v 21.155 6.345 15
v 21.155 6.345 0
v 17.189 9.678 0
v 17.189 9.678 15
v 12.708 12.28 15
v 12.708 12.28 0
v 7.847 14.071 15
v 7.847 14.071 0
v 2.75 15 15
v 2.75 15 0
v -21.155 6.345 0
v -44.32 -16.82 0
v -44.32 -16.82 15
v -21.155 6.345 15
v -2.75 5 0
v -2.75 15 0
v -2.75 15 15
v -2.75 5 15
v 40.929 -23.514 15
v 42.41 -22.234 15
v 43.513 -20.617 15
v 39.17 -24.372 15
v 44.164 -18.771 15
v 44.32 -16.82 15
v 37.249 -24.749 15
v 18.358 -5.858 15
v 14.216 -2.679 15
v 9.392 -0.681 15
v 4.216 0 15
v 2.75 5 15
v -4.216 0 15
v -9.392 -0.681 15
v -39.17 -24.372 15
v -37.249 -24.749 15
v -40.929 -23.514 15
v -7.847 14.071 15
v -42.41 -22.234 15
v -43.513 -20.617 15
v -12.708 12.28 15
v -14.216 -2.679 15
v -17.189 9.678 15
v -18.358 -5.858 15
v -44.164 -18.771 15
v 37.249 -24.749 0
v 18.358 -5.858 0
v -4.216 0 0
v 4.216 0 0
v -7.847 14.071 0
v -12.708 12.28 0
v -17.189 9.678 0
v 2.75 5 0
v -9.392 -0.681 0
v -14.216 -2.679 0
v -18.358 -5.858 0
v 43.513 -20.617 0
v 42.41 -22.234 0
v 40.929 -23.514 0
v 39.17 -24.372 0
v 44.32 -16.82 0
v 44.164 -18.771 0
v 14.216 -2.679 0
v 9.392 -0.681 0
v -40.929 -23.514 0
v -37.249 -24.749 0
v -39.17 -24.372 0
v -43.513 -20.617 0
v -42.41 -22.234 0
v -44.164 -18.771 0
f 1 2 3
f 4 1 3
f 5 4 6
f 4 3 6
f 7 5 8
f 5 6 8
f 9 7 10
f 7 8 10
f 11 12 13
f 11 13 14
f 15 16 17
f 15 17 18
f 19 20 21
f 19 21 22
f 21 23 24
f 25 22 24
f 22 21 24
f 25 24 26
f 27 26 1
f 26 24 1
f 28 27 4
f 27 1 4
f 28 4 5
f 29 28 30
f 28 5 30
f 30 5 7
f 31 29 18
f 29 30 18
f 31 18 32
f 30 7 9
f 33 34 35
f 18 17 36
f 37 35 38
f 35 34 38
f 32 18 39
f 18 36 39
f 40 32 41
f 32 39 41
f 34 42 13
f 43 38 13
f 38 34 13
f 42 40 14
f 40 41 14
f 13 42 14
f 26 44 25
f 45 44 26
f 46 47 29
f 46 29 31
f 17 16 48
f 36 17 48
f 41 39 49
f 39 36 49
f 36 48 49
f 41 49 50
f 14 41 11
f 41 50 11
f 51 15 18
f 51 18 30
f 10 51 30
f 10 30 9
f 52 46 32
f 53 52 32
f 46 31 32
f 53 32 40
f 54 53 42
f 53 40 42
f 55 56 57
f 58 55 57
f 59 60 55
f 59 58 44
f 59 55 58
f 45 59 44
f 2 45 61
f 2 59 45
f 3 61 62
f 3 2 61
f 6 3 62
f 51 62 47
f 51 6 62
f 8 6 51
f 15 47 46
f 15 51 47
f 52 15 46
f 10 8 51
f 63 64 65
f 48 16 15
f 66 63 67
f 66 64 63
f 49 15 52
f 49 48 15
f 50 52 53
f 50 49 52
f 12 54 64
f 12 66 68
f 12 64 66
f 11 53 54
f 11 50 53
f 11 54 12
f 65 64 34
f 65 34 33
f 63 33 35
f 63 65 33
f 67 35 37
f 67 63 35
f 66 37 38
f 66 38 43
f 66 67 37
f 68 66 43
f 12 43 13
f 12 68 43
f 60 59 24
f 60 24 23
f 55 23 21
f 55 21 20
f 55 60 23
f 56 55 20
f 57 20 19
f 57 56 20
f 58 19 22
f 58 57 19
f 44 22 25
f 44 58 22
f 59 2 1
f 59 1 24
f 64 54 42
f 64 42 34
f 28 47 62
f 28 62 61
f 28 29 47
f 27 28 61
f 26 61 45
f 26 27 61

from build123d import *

# Parameters (mm, degrees)
ESTRUSIONE_ESTRUSIONE1_DEPTH = 15
RACCORDO1_R                  = 30
RACCORDO2_R                  = 20


with BuildPart() as part:
    # Schizzo2 → Estrusione-Estrusione1 (new body)
    with BuildSketch(Plane.XY):
        with BuildLine():
            Line((12.5, 0), (-12.5, 0))
            Line((-12.5, 0), (-37.248737342, -24.748737342))
            ThreePointArc((-37.248737342, -24.748737342), (-42.410299766, -22.234372931), (-44.319805153, -16.819805153))
            Line((-44.319805153, -16.819805153), (-12.5, 15))
            Line((-12.5, 15), (-2.75, 15))
            Line((-2.75, 15), (-2.75, 5))
            Line((-2.75, 5), (2.75, 5))
            Line((2.75, 5), (2.75, 15))
            Line((2.75, 15), (12.5, 15))
            Line((12.5, 15), (44.319805153, -16.819805153))
            ThreePointArc((44.319805153, -16.819805153), (42.410299766, -22.234372931), (37.248737342, -24.748737342))
            Line((37.248737342, -24.748737342), (12.5, 0))
        make_face()
    extrude(amount=ESTRUSIONE_ESTRUSIONE1_DEPTH)

    # Raccordo1
    # the kernel refuses this fillet: 30 mm, written as the material it takes off along each edge
    with BuildSketch(Plane(origin=(12.5, 15, -30.600334507), x_dir=(-1, 0, 0), z_dir=(0, 0, 1))) as raccordo1_piece_1:
        with BuildLine():
            CenterArc((12.558121821, 29.86828505), RACCORDO1_R, 225, 39.629019647)
            Line((-8.655081615, 8.655081615), (-9.079345683, 8.230817546))
            Line((-9.079345683, 8.230817546), (-0.424264069, -0.424264069))
            Line((-0.424264069, -0.424264069), (0, -0.6))
            ThreePointArc((0, -0.6), (4.875, -0.6), (9.693837564, -0.597365701))
            Line((9.693837564, -0.597365701), (9.75, 0))
        make_face()
    extrude(amount=76.200669014, mode=Mode.SUBTRACT)
    with BuildSketch(Plane(origin=(-12.5, 15, -30.600334507), x_dir=(-0.7071067811865485, -0.7071067811865467, 0), z_dir=(0, 0, 1))) as raccordo1_piece_2:
        with BuildLine():
            CenterArc((12.240133803, 30), RACCORDO1_R, 230.370980353, 39.629019647)
            Line((-6.894291117, 6.894291117), (-7.276979615, 6.432176939))
            ThreePointArc((-7.276979615, 6.432176939), (-3.871409627, 3.02288149), (-0.424264069, -0.424264069))
            Line((-0.424264069, -0.424264069), (0, -0.6))
            Line((0, -0.6), (12.240133803, -0.6))
            Line((12.240133803, -0.6), (12.240133803, 0))
        make_face()
    extrude(amount=76.200669014, mode=Mode.SUBTRACT)

    # Raccordo2
    raccordo2_edges = [part.edges().sort_by_distance(p)[0] for p in [
        (12.5, 0, 7.5),
        (-12.5, 0, 7.5),
    ]]
    fillet(raccordo2_edges, radius=RACCORDO2_R)


solid = part.part
